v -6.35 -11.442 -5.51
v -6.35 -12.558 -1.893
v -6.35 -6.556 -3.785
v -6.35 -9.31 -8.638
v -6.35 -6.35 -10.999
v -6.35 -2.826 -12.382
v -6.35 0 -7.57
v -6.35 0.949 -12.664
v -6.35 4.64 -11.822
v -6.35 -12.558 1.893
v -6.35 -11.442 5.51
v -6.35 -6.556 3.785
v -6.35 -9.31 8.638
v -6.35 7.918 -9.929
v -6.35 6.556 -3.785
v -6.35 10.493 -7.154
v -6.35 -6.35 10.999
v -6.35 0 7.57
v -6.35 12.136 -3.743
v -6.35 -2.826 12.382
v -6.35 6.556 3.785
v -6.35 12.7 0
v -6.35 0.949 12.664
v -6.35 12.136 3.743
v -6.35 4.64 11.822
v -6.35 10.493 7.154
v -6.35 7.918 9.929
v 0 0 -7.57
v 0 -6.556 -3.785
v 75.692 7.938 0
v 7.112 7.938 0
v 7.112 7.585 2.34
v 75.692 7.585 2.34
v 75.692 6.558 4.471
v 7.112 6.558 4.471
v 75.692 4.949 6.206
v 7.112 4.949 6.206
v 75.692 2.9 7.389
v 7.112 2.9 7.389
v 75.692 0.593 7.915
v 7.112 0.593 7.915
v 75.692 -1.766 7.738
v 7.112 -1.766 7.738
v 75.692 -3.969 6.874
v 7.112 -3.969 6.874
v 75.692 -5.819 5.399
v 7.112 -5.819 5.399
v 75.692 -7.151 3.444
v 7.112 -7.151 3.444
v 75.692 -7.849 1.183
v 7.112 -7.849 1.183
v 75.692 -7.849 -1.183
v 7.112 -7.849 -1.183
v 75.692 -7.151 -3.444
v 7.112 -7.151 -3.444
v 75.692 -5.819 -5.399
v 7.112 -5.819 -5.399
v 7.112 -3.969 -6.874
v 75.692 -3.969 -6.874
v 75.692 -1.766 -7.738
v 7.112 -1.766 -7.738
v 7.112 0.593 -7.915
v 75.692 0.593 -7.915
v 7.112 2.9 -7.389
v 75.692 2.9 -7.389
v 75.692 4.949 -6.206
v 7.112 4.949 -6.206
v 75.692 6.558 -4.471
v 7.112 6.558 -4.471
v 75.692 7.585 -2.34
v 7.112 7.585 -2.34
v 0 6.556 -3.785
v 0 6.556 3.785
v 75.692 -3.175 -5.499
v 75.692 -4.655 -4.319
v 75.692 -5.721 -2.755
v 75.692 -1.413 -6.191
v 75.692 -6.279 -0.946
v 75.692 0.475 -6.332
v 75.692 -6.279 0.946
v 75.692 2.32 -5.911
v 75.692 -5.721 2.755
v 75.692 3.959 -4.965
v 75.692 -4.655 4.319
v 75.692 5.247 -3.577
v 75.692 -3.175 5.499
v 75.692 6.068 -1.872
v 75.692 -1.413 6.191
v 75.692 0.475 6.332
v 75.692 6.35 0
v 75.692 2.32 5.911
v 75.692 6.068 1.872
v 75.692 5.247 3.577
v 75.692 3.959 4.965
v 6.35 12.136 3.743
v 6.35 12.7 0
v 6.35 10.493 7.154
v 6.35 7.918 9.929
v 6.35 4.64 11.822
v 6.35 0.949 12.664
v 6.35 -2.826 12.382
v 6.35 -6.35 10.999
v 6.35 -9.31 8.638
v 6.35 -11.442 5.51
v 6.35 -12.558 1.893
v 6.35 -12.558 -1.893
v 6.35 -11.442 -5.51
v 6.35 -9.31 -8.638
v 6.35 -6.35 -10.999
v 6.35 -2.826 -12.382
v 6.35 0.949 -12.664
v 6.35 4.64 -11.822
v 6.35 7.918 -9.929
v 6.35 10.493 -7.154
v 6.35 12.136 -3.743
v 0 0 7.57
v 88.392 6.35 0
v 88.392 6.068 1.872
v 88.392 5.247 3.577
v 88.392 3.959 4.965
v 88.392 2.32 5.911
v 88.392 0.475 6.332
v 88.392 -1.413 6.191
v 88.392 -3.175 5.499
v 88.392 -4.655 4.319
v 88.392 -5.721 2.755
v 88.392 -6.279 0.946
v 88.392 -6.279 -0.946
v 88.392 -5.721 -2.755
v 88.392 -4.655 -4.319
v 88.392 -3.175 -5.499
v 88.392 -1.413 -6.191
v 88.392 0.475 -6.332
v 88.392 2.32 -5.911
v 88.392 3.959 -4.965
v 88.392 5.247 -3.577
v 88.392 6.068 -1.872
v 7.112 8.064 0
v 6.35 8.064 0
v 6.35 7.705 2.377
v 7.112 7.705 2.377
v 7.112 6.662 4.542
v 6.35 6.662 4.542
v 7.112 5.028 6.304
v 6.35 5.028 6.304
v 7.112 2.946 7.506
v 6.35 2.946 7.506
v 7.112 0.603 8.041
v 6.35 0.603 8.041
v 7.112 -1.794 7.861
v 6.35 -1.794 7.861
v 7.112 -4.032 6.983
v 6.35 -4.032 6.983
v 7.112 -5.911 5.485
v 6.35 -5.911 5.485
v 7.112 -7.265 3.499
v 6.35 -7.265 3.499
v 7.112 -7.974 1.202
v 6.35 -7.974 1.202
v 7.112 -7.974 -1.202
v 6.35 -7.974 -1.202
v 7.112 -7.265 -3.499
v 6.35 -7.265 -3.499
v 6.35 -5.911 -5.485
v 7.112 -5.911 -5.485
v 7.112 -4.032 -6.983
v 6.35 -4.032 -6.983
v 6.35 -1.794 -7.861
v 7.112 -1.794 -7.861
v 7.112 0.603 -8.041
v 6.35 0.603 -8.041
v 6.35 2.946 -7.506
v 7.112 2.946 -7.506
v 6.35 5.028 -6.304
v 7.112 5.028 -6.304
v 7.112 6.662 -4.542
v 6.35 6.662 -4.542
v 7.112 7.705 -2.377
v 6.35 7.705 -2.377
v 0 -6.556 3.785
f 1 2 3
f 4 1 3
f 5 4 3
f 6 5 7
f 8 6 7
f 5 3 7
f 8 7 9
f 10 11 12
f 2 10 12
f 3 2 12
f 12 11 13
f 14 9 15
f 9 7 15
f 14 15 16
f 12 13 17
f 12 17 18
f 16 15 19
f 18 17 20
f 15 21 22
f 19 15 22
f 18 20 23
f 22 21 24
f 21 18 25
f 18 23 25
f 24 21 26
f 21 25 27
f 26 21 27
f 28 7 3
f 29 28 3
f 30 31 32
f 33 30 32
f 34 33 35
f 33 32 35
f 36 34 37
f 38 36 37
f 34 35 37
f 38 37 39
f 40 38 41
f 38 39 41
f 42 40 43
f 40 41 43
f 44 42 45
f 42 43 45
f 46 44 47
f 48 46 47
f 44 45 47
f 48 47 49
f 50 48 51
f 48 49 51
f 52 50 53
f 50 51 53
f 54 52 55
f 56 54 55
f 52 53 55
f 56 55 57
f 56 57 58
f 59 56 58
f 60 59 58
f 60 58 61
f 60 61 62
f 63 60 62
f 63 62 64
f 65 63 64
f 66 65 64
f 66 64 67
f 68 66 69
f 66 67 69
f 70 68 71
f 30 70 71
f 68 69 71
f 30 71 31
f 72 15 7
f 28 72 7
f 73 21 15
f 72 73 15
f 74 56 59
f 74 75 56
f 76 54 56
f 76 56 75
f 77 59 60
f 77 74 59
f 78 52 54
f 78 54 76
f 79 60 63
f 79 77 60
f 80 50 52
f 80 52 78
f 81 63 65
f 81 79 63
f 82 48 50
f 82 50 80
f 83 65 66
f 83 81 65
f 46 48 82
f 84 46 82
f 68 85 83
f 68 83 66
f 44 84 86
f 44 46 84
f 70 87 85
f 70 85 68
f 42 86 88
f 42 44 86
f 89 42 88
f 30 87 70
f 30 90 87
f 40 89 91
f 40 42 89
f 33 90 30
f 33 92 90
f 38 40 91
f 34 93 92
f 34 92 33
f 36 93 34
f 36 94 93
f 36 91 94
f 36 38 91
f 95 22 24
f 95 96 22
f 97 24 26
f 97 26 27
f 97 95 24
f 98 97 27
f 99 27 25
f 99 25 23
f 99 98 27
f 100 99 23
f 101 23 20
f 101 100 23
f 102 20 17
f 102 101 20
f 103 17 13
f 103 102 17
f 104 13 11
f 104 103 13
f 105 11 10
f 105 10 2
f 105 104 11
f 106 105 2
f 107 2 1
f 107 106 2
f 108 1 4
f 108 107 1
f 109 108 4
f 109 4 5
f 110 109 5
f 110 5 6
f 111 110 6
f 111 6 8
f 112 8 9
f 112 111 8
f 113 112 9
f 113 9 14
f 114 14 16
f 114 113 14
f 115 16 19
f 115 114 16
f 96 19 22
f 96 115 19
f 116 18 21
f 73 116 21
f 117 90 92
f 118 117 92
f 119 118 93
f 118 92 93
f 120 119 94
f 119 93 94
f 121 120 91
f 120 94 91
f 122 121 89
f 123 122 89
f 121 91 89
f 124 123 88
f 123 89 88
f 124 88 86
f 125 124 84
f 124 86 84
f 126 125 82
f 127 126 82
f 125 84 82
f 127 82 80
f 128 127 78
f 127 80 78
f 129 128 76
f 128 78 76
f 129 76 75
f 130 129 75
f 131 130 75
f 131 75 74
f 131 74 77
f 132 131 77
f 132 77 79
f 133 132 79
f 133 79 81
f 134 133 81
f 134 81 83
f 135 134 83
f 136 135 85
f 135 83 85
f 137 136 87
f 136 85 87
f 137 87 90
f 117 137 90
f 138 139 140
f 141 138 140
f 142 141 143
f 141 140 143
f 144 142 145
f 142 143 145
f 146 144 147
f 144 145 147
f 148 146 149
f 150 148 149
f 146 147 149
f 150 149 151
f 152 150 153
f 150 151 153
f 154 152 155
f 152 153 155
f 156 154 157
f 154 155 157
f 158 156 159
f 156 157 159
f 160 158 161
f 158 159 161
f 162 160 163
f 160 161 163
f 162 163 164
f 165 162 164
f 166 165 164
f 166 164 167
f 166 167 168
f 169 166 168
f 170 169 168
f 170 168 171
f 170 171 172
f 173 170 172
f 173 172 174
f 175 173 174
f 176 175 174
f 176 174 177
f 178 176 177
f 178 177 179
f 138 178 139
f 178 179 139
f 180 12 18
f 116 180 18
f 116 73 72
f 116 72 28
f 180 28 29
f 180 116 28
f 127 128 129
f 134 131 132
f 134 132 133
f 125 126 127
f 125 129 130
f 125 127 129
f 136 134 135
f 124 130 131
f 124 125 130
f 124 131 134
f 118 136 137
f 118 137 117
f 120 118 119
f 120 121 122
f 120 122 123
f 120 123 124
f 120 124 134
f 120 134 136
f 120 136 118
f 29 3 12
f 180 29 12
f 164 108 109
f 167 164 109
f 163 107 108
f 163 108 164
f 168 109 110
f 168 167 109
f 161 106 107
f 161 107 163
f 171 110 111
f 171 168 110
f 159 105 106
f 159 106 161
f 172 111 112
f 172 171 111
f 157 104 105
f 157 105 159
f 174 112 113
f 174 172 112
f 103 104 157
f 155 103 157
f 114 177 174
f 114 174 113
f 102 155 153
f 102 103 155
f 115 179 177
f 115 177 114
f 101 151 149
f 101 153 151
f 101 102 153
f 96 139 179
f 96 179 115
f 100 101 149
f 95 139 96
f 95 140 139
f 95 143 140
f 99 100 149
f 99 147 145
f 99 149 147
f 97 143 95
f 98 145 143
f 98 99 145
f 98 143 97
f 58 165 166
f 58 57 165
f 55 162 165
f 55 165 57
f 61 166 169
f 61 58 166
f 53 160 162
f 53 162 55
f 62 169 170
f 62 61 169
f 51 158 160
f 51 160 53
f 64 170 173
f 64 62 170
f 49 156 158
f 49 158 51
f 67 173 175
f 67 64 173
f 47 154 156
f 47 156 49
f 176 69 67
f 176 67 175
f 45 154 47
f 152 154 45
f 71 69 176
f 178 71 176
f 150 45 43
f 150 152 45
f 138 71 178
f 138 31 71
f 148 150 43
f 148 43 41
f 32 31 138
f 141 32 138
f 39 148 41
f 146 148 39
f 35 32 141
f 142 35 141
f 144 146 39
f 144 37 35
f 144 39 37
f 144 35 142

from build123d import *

# Parameters (mm, degrees)
F0_R     = 12.7
F1_DEPTH = 6.35
F2_R     = 8.063613
F3_DEPTH = 0.762
F4_R     = 7.9375
F5_DEPTH = 68.58
F6_R     = 6.35
F7_DEPTH = 12.7
F9_DEPTH = 6.35


with BuildPart() as f1:
    # F0 (on Right) → F1 (new body, symmetric)
    with BuildSketch(Plane.YZ):
        Circle(F0_R)
    extrude(amount=F1_DEPTH, both=True)

    # F2 (on face) → F3 (join)
    with BuildSketch(Plane.YZ.offset(6.35)):
        Circle(F2_R)
    extrude(amount=F3_DEPTH)

    # F4 (on face) → F5 (join)
    with BuildSketch(Plane.YZ.offset(7.112)):
        Circle(F4_R)
    extrude(amount=F5_DEPTH)

    # F6 (on face) → F7 (join)
    with BuildSketch(Plane.YZ.offset(75.692)):
        Circle(F6_R)
    extrude(amount=F7_DEPTH)

    # F8 (on face) → F9 (cut)
    with BuildSketch(Plane(origin=(-6.35, 0, 0), x_dir=(0, -1, 0), z_dir=(-1, 0, 0))):
        Polygon((6.555755, -3.784967), (6.555755, 3.784967), (0, 7.569933), (-6.555755, 3.784967), (-6.555755, -3.784967), (0, -7.569933), align=None)
    extrude(amount=-F9_DEPTH, mode=Mode.SUBTRACT)


solid = f1.part
